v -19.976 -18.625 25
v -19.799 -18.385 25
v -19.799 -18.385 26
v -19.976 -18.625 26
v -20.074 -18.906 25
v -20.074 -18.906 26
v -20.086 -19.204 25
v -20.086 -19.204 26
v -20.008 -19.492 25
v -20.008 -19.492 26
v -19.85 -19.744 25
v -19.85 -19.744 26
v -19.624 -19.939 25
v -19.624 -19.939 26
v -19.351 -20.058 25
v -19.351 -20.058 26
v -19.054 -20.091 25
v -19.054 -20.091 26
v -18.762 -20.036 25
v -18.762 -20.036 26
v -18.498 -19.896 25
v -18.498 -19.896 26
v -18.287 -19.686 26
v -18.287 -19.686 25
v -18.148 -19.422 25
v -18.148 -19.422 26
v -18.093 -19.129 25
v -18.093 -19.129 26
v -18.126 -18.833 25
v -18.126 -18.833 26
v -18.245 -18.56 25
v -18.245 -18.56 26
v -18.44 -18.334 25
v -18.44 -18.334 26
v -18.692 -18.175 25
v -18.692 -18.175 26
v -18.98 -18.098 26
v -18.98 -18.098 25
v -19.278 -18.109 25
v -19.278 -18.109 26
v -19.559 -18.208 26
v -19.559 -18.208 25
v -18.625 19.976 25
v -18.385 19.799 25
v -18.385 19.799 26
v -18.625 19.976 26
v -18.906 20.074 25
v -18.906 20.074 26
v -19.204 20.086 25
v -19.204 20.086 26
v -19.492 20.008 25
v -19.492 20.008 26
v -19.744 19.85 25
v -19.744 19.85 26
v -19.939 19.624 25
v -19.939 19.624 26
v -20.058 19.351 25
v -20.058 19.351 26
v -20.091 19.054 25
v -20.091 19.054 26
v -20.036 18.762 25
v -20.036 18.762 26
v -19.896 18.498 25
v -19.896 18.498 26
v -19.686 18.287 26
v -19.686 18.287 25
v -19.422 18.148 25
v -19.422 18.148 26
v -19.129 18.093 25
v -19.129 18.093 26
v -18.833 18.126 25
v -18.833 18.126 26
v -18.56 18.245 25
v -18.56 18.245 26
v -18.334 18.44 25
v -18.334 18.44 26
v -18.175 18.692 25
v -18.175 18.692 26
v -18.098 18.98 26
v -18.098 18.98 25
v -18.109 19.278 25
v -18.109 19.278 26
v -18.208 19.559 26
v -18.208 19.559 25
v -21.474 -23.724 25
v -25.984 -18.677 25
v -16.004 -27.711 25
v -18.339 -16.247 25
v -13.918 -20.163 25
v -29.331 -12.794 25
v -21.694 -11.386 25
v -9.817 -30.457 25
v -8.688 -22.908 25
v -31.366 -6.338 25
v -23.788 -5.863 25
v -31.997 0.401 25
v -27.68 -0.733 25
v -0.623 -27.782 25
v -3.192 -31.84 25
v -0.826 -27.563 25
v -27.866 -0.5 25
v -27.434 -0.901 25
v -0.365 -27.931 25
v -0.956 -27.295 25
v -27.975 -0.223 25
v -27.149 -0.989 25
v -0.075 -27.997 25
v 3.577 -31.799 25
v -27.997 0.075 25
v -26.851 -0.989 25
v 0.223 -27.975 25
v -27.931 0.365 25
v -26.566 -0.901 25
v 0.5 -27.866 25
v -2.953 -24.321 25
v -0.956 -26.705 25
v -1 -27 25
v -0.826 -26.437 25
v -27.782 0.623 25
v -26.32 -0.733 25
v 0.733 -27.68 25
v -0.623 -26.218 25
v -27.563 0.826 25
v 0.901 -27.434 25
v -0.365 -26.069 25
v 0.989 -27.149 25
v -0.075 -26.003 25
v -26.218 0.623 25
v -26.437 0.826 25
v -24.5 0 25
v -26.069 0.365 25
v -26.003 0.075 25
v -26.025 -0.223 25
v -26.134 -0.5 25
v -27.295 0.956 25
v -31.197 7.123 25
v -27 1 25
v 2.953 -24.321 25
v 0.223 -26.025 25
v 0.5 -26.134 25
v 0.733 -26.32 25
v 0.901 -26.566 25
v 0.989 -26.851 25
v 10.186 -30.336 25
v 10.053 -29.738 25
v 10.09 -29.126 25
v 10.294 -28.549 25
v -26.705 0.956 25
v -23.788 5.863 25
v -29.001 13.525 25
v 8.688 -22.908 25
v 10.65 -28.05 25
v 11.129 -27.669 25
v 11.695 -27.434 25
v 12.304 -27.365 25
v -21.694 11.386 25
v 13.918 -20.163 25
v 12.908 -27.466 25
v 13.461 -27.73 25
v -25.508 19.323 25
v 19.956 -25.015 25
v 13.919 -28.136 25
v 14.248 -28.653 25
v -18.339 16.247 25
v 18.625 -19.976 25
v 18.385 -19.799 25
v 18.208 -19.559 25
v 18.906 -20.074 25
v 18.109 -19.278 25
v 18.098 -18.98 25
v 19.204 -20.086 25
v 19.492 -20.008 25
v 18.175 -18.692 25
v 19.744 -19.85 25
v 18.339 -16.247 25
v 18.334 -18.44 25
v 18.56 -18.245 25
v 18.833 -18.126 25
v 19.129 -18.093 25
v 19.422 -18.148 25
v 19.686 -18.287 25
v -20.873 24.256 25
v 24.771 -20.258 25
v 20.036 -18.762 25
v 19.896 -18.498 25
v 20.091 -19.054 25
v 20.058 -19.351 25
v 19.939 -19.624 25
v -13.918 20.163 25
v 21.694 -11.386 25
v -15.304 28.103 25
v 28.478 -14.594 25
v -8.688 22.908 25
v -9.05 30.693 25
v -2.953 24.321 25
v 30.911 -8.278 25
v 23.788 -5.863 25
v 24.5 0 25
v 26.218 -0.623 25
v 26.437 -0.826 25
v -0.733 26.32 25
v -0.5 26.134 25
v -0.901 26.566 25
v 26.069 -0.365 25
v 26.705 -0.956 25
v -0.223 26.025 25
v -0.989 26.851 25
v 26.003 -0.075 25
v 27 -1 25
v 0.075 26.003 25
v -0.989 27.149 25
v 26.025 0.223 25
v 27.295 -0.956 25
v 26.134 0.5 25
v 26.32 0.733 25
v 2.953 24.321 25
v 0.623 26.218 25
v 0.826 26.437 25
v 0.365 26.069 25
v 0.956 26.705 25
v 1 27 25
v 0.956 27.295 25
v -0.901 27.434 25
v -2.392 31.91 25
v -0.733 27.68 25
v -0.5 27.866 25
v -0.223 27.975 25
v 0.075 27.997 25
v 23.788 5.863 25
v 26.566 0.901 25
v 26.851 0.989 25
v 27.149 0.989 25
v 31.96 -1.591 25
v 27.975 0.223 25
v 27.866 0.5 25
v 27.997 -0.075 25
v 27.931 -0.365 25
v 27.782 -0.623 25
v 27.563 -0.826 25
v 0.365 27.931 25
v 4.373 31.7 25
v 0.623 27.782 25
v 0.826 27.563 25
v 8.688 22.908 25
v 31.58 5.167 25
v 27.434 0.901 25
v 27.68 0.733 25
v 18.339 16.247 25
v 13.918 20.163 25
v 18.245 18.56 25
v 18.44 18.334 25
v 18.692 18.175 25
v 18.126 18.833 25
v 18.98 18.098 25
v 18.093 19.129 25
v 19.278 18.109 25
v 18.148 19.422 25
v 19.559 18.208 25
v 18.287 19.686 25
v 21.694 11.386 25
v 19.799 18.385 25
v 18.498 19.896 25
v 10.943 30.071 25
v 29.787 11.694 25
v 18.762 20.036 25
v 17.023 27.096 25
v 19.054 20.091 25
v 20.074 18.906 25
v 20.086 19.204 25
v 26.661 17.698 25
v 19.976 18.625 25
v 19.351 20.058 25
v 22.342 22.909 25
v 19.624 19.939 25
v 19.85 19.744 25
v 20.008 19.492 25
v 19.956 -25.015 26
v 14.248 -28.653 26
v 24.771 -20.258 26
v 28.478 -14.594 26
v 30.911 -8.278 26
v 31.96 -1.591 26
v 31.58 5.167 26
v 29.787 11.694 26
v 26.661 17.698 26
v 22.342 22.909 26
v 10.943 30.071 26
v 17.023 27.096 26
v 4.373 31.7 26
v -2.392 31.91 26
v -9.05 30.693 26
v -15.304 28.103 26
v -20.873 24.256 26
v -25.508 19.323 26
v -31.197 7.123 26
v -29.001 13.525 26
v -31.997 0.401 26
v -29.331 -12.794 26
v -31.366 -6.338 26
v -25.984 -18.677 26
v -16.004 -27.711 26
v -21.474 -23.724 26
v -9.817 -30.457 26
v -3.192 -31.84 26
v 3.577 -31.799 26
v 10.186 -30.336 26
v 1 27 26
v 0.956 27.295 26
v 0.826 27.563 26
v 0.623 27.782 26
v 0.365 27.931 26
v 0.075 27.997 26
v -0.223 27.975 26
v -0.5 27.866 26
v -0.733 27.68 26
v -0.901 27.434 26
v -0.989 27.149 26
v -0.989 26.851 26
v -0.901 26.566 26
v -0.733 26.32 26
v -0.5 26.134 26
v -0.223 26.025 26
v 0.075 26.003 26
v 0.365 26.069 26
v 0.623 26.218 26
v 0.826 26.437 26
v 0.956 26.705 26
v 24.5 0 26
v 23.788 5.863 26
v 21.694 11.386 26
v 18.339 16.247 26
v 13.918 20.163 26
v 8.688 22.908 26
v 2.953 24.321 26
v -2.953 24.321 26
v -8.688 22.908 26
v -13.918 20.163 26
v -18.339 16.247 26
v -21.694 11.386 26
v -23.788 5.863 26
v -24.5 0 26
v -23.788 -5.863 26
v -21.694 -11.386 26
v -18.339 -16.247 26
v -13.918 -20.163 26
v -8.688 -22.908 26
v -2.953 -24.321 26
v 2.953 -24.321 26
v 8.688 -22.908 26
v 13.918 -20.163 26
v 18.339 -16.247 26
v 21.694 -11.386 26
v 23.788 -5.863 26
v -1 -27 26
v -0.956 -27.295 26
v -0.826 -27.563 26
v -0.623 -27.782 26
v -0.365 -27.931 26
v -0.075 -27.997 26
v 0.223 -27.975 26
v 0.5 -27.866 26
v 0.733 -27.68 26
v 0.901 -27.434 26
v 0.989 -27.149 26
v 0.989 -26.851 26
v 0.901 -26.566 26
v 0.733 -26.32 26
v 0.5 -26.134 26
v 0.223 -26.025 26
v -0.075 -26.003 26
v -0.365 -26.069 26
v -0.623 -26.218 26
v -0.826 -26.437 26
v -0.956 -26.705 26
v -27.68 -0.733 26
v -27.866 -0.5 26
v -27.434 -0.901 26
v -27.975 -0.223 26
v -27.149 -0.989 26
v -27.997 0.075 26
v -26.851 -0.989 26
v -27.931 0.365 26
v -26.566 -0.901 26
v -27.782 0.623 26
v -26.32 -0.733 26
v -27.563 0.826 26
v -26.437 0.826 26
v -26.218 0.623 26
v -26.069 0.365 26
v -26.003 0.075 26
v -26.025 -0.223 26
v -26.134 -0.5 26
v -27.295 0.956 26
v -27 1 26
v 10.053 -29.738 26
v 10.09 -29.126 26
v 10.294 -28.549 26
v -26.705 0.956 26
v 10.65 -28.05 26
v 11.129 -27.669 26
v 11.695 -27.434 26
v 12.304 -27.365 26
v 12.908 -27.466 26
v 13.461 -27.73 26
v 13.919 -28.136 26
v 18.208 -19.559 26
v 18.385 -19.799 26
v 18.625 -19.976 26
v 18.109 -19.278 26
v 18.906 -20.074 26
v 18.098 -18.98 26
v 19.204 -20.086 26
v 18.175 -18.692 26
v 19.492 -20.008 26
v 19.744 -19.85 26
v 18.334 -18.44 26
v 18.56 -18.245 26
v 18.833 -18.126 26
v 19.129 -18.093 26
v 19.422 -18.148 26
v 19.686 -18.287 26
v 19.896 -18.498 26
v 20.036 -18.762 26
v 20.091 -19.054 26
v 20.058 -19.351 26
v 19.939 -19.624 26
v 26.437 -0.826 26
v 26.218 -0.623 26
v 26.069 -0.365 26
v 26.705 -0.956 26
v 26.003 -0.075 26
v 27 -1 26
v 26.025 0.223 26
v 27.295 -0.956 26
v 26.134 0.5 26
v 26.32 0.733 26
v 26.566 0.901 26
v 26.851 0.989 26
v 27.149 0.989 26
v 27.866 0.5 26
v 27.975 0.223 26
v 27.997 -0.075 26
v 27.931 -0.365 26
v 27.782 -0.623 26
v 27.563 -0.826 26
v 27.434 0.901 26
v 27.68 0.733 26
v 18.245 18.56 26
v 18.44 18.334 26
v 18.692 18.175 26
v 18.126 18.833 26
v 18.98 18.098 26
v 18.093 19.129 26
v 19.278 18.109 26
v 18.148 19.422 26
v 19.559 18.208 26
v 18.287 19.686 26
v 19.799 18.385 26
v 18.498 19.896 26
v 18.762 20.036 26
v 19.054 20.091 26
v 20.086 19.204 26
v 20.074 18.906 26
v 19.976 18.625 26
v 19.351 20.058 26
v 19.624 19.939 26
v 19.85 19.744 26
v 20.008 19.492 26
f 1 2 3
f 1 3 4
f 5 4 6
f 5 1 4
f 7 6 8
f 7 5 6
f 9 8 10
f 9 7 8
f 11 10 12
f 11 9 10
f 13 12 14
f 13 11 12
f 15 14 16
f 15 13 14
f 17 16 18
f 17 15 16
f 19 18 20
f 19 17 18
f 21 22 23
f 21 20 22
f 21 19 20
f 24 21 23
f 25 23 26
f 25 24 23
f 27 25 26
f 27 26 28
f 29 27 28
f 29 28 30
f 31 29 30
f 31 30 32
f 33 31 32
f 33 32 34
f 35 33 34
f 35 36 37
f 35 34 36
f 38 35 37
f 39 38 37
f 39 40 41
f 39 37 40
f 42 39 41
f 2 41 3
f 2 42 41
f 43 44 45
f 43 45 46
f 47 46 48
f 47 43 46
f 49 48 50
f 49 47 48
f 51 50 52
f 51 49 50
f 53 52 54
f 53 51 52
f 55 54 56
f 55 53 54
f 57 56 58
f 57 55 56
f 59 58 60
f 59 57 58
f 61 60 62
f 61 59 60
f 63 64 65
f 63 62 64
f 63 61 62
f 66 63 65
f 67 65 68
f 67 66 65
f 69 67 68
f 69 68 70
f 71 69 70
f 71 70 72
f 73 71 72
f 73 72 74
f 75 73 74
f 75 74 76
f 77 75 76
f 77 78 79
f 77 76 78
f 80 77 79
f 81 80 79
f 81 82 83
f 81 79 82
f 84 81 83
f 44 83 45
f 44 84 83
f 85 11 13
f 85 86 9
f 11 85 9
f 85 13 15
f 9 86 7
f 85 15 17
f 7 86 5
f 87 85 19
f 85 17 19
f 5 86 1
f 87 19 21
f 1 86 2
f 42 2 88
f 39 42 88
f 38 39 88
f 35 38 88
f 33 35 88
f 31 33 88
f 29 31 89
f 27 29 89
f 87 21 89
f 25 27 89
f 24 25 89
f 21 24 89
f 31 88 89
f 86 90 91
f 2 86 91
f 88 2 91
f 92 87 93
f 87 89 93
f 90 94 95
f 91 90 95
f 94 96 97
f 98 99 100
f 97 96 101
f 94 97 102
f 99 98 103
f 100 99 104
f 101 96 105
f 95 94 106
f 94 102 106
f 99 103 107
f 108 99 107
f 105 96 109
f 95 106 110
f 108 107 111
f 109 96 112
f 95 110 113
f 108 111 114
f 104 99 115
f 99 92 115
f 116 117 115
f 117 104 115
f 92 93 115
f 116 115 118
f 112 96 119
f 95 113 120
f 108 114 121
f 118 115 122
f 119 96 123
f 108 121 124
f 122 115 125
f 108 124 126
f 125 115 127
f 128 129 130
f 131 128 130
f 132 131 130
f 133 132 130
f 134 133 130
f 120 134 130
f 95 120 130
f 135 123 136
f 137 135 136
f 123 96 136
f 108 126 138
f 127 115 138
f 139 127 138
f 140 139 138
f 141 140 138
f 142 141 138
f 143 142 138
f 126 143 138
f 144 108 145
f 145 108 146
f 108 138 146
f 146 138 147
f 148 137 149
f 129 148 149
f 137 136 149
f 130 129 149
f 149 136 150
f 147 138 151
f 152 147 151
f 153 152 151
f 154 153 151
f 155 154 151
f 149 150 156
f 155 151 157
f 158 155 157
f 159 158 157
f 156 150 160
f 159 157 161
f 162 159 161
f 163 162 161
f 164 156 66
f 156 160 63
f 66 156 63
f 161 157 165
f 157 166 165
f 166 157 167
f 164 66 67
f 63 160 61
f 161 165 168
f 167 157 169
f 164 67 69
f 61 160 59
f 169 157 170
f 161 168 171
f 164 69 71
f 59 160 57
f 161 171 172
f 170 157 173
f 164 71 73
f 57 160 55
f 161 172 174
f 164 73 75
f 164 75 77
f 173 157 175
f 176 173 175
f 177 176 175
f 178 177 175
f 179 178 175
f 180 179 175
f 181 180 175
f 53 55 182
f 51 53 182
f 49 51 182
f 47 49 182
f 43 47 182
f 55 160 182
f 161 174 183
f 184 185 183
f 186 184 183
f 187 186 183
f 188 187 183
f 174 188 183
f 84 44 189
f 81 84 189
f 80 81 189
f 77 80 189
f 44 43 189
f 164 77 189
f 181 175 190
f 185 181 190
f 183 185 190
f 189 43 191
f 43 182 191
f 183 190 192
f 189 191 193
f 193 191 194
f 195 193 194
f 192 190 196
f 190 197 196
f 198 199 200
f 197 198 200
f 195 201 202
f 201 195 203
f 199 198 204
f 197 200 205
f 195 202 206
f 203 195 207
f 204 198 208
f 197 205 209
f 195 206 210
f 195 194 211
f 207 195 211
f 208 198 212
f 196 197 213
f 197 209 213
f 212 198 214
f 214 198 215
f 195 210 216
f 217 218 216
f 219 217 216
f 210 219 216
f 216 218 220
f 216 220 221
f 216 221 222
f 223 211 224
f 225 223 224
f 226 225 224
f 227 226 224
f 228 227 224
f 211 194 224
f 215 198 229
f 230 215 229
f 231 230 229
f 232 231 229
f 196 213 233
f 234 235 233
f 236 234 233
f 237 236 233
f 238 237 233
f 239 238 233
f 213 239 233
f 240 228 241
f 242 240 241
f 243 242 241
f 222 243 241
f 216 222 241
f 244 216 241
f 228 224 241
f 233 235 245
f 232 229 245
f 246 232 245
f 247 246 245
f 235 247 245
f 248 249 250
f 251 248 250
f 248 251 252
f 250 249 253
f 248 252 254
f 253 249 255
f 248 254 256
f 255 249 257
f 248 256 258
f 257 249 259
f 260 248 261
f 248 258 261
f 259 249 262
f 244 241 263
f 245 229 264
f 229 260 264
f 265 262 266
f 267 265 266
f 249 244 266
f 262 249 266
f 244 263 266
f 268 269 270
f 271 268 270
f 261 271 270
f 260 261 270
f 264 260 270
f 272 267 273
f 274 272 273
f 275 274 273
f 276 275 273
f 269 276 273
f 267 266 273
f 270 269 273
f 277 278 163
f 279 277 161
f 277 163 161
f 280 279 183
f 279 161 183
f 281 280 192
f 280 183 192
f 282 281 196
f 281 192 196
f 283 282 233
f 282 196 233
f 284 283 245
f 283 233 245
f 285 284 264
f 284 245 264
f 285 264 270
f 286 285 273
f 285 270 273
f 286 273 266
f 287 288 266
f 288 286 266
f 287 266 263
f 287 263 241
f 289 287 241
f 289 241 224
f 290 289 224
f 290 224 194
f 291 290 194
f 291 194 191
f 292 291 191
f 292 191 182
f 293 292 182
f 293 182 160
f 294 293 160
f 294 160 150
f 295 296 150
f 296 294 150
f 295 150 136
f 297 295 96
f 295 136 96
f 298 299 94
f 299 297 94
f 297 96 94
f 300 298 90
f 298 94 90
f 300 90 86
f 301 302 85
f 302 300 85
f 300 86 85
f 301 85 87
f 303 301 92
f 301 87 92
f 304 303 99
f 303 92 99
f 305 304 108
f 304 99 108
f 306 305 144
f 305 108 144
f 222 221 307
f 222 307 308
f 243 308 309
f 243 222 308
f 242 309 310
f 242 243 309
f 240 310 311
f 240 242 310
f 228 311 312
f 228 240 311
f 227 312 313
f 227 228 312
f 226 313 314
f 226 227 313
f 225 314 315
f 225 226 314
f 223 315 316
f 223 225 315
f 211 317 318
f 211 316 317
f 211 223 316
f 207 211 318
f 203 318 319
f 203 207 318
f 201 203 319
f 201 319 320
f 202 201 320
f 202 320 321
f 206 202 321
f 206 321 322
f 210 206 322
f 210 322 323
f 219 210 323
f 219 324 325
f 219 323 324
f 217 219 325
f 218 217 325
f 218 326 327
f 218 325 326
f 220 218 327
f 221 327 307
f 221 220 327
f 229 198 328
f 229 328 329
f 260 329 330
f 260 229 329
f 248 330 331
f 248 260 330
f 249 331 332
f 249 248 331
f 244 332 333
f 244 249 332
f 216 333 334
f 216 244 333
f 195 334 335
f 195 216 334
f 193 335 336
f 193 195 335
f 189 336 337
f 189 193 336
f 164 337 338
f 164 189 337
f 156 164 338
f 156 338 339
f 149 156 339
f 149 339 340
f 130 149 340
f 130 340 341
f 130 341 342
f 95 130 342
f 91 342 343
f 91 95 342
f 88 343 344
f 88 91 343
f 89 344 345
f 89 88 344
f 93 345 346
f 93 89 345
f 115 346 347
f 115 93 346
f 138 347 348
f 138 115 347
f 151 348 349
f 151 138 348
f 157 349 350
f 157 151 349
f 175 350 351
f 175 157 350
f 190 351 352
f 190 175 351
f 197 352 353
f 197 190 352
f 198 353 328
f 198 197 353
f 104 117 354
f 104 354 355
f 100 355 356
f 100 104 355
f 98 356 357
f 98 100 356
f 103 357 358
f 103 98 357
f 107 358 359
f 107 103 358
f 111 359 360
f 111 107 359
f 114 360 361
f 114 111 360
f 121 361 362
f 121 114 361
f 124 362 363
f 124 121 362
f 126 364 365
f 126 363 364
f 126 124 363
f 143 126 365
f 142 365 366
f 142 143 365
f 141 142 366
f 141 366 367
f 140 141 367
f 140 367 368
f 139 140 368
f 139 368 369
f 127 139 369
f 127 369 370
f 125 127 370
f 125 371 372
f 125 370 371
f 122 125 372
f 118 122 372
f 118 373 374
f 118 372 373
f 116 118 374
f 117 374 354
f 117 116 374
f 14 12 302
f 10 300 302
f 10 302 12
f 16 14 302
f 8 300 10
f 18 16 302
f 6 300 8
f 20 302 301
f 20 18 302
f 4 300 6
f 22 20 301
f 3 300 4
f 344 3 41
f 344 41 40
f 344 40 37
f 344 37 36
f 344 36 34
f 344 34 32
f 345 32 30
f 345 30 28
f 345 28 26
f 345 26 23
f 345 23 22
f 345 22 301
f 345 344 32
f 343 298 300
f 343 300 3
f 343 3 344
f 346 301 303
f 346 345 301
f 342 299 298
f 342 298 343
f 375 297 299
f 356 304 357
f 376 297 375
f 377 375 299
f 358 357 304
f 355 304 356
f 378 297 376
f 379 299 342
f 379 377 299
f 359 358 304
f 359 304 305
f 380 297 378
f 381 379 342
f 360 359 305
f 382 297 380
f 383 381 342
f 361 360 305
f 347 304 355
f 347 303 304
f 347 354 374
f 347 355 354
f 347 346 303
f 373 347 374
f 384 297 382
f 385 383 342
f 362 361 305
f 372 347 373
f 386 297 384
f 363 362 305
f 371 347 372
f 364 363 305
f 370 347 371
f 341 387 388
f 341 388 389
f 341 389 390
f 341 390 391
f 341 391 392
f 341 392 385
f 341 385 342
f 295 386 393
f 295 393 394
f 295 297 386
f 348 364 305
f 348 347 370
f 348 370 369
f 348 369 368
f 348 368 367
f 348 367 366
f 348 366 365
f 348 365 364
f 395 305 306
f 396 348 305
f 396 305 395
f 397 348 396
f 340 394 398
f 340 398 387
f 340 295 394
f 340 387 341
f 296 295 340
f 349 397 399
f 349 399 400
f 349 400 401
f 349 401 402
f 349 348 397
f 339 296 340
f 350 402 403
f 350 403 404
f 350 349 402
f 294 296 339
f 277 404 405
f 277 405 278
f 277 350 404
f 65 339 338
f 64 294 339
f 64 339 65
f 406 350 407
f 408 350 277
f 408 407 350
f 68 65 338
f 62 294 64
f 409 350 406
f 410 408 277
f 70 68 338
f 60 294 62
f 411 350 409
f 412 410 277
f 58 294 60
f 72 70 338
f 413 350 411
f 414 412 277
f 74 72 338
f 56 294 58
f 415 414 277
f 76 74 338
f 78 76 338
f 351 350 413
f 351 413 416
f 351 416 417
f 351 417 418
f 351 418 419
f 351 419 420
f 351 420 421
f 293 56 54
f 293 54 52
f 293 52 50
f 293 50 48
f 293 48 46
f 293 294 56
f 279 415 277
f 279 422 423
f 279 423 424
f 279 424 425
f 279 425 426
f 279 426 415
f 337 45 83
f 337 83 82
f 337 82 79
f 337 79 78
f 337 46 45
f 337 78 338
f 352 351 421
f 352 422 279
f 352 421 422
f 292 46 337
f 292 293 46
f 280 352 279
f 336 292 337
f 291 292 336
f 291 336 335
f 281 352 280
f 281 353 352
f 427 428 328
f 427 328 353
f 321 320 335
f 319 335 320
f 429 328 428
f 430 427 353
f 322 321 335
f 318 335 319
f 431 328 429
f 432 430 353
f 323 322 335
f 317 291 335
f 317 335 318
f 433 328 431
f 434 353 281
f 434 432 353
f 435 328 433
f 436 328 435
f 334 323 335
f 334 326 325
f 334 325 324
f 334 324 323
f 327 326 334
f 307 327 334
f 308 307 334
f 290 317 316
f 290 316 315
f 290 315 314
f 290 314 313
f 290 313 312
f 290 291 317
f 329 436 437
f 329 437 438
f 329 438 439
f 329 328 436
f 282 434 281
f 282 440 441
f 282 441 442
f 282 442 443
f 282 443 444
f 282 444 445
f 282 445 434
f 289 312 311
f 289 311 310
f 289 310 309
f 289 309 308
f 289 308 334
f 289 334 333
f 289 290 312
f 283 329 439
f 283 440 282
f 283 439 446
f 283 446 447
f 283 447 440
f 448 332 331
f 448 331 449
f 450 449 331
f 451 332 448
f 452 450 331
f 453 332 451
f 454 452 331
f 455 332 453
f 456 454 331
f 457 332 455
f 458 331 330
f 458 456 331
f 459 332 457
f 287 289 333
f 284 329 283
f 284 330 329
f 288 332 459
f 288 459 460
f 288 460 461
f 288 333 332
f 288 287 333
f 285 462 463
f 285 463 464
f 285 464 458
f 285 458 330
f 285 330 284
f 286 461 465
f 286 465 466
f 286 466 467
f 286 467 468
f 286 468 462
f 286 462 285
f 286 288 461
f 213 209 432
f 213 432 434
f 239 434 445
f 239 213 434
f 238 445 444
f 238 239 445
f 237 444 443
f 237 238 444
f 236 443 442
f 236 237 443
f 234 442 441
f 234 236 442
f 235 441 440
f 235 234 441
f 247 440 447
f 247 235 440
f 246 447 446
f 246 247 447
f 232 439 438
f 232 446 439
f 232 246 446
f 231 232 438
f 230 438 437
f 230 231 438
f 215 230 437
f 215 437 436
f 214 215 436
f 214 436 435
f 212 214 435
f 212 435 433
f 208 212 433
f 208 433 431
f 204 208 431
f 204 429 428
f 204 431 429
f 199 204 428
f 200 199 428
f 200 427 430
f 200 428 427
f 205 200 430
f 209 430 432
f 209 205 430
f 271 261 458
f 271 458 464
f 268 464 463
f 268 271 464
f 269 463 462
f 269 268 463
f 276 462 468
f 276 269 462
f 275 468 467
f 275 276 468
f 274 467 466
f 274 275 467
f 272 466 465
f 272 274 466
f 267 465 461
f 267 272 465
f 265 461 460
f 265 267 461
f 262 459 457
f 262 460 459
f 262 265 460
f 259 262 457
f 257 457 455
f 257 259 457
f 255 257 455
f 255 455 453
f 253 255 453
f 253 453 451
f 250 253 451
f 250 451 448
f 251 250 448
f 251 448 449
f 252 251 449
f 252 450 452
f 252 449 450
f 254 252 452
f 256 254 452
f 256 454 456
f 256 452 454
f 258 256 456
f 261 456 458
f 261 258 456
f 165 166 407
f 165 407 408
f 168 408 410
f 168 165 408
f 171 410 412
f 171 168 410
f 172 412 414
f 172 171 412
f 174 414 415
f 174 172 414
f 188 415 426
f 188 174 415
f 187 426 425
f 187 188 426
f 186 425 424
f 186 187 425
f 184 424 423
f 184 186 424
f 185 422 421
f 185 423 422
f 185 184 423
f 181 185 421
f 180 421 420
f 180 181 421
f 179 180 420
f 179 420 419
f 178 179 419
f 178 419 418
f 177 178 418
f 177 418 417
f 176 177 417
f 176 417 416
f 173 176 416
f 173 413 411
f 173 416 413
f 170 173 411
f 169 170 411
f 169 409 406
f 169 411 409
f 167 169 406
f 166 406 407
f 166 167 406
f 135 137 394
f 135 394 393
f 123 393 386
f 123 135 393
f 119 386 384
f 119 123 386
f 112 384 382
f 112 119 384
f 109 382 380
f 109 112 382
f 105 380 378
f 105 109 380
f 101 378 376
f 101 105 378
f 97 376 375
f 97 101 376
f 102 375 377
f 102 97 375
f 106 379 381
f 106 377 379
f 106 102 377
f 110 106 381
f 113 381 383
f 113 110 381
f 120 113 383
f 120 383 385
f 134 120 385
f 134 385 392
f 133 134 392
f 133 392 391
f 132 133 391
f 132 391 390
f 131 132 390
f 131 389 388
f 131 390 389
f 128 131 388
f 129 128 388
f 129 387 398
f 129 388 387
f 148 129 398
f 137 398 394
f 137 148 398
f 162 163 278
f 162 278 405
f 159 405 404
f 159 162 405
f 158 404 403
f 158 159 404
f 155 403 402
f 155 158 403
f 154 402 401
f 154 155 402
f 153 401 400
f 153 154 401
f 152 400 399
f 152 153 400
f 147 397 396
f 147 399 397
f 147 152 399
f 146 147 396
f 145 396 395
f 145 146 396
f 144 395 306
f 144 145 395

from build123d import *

# Parameters (mm, degrees)
CYLINDER1267_R               = 2.2
CYLINDER1267_DEPTH           = 15
CYLINDER1267_PLACEMENT_ANGLE = 22.5
CYLINDER1272_R               = 1
CYLINDER1272_DEPTH           = 20
CYLINDER1272_PLACEMENT_ANGLE = 45
CYLINDER1266_R               = 1
CYLINDER1266_DEPTH           = 20
CYLINDER1277_R               = 1
CYLINDER1277_DEPTH           = 20
CYLINDER1277_PLACEMENT_ANGLE = 135
CYLINDER1269_R               = 1
CYLINDER1269_DEPTH           = 20
CYLINDER1275_R               = 1
CYLINDER1275_DEPTH           = 20
CYLINDER1275_PLACEMENT_ANGLE = 225
CYLINDER1274_R               = 1
CYLINDER1274_DEPTH           = 20
CYLINDER1270_R               = 1
CYLINDER1270_DEPTH           = 20
CYLINDER1270_PLACEMENT_ANGLE = 45
CYLINDER1276_R               = 1
CYLINDER1276_DEPTH           = 20
TUBE051_R                    = 32
TUBE051_R_2                  = 24.5
TUBE051_DEPTH                = 1


with BuildPart() as v_lec1267:
    # Cylinder1267 → Cylinder1267 (new body)
    with BuildSketch(Plane.XY):
        Circle(CYLINDER1267_R)
    extrude(amount=CYLINDER1267_DEPTH)


with BuildPart() as v_lec1267_1:
    # Cylinder1267 placement: moved
    add(v_lec1267.part.moved(Location((12.24587, -29.564145, 20))).rotate(Axis((12.24587, -29.564145, 20), (0, 0, 1)), CYLINDER1267_PLACEMENT_ANGLE))


with BuildPart() as v_lec1272:
    # Cylinder1272 → Cylinder1272 (new body)
    with BuildSketch(Plane.XY):
        Circle(CYLINDER1272_R)
    extrude(amount=CYLINDER1272_DEPTH)


with BuildPart() as v_lec1272_1:
    # Cylinder1272 placement: moved
    add(v_lec1272.part.moved(Location((-19.091883, 19.091883, 19))).rotate(Axis((-19.091883, 19.091883, 19), (0, 0, 1)), CYLINDER1272_PLACEMENT_ANGLE))


with BuildPart() as v_lec1266:
    # Cylinder1266 → Cylinder1266 (new body)
    with BuildSketch(Plane(origin=(-27, 0, 19), x_dir=(0, 1, 0), z_dir=(0, 0, 1))):
        Circle(CYLINDER1266_R)
    extrude(amount=CYLINDER1266_DEPTH)


with BuildPart() as v_lec1277:
    # Cylinder1277 → Cylinder1277 (new body)
    with BuildSketch(Plane.XY):
        Circle(CYLINDER1277_R)
    extrude(amount=CYLINDER1277_DEPTH)


with BuildPart() as v_lec1277_1:
    # Cylinder1277 placement: moved
    add(v_lec1277.part.moved(Location((-19.091883, -19.091883, 19))).rotate(Axis((-19.091883, -19.091883, 19), (0, 0, 1)), CYLINDER1277_PLACEMENT_ANGLE))


with BuildPart() as v_lec1269:
    # Cylinder1269 → Cylinder1269 (new body)
    with BuildSketch(Plane(origin=(0, -27, 19), x_dir=(-1, 0, 0), z_dir=(0, 0, 1))):
        Circle(CYLINDER1269_R)
    extrude(amount=CYLINDER1269_DEPTH)


with BuildPart() as v_lec1275:
    # Cylinder1275 → Cylinder1275 (new body)
    with BuildSketch(Plane.XY):
        Circle(CYLINDER1275_R)
    extrude(amount=CYLINDER1275_DEPTH)


with BuildPart() as v_lec1275_1:
    # Cylinder1275 placement: moved
    add(v_lec1275.part.moved(Location((19.091883, -19.091883, 19))).rotate(Axis((19.091883, -19.091883, 19), (0, 0, 1)), CYLINDER1275_PLACEMENT_ANGLE))


with BuildPart() as v_lec1274:
    # Cylinder1274 → Cylinder1274 (new body)
    with BuildSketch(Plane(origin=(27, 0, 19), x_dir=(0, -1, 0), z_dir=(0, 0, 1))):
        Circle(CYLINDER1274_R)
    extrude(amount=CYLINDER1274_DEPTH)


with BuildPart() as v_lec1270:
    # Cylinder1270 → Cylinder1270 (new body)
    with BuildSketch(Plane.XY):
        Circle(CYLINDER1270_R)
    extrude(amount=CYLINDER1270_DEPTH)


with BuildPart() as v_lec1270_1:
    # Cylinder1270 placement: moved
    add(v_lec1270.part.moved(Location((19.091883, 19.091883, 19))).rotate(Axis((19.091883, 19.091883, 19), (0, 0, -1)), CYLINDER1270_PLACEMENT_ANGLE))


with BuildPart() as compound677:
    # Cylinder1276 → Cylinder1276 (new body)
    with BuildSketch(Plane(origin=(0, 27, 19), x_dir=(1, 0, 0), z_dir=(0, 0, 1))):
        Circle(CYLINDER1276_R)
    extrude(amount=CYLINDER1276_DEPTH)

    # Compound677: union Válec1272, Válec1266, Válec1277, Válec1269, Válec1275, Válec1274, Válec1270
    add(v_lec1272_1.part)
    add(v_lec1266.part)
    add(v_lec1277_1.part)
    add(v_lec1269.part)
    add(v_lec1275_1.part)
    add(v_lec1274.part)
    add(v_lec1270_1.part)


with BuildPart() as cut479:
    # Tube051 → Tube051 (new body)
    with BuildSketch(Plane.XY.offset(25)):
        Circle(TUBE051_R)
        Circle(TUBE051_R_2, mode=Mode.SUBTRACT)
    extrude(amount=TUBE051_DEPTH)

    # Cut476: cut Compound677
    add(compound677.part, mode=Mode.SUBTRACT)

    # Cut479: cut Válec1267
    add(v_lec1267_1.part, mode=Mode.SUBTRACT)


solid = cut479.part
